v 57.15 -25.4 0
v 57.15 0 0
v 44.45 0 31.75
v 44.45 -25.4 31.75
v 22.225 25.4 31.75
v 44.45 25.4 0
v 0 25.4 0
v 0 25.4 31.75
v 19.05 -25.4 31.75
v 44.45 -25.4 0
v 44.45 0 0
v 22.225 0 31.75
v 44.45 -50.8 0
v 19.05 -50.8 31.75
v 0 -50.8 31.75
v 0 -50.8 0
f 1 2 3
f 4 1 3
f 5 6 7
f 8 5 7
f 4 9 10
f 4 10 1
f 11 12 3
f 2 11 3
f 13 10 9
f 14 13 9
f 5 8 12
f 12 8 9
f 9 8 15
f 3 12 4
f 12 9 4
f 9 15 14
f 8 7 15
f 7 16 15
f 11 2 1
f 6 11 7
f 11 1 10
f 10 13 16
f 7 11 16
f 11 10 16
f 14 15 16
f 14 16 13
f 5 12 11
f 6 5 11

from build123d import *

# Parameters (mm, degrees)
F1_DEPTH = 25.4
F3_DEPTH = 25.4
F5_DEPTH = 25.4


with BuildPart() as f1:
    # F0 (on Front) → F1 (new body)
    with BuildSketch(Plane.XZ):
        Polygon((0, 31.75), (0, 0), (57.15, 0), (44.45, 31.75), align=None)
    extrude(amount=F1_DEPTH)

    # F2 (on face) → F3 (join)
    with BuildSketch(Plane.XZ.offset(25.4)):
        Polygon((0, 31.75), (0, 0), (44.45, 0), (19.05, 31.75), align=None)
    extrude(amount=F3_DEPTH)

    # F4 (on face) → F5 (join)
    with BuildSketch(Plane(origin=(0, 0, 0), x_dir=(-1, 0, 0), z_dir=(0, 1, 0))):
        Polygon((-44.45, 0), (0, 0), (0, 31.75), (-22.225, 31.75), align=None)
    extrude(amount=F5_DEPTH)


solid = f1.part
